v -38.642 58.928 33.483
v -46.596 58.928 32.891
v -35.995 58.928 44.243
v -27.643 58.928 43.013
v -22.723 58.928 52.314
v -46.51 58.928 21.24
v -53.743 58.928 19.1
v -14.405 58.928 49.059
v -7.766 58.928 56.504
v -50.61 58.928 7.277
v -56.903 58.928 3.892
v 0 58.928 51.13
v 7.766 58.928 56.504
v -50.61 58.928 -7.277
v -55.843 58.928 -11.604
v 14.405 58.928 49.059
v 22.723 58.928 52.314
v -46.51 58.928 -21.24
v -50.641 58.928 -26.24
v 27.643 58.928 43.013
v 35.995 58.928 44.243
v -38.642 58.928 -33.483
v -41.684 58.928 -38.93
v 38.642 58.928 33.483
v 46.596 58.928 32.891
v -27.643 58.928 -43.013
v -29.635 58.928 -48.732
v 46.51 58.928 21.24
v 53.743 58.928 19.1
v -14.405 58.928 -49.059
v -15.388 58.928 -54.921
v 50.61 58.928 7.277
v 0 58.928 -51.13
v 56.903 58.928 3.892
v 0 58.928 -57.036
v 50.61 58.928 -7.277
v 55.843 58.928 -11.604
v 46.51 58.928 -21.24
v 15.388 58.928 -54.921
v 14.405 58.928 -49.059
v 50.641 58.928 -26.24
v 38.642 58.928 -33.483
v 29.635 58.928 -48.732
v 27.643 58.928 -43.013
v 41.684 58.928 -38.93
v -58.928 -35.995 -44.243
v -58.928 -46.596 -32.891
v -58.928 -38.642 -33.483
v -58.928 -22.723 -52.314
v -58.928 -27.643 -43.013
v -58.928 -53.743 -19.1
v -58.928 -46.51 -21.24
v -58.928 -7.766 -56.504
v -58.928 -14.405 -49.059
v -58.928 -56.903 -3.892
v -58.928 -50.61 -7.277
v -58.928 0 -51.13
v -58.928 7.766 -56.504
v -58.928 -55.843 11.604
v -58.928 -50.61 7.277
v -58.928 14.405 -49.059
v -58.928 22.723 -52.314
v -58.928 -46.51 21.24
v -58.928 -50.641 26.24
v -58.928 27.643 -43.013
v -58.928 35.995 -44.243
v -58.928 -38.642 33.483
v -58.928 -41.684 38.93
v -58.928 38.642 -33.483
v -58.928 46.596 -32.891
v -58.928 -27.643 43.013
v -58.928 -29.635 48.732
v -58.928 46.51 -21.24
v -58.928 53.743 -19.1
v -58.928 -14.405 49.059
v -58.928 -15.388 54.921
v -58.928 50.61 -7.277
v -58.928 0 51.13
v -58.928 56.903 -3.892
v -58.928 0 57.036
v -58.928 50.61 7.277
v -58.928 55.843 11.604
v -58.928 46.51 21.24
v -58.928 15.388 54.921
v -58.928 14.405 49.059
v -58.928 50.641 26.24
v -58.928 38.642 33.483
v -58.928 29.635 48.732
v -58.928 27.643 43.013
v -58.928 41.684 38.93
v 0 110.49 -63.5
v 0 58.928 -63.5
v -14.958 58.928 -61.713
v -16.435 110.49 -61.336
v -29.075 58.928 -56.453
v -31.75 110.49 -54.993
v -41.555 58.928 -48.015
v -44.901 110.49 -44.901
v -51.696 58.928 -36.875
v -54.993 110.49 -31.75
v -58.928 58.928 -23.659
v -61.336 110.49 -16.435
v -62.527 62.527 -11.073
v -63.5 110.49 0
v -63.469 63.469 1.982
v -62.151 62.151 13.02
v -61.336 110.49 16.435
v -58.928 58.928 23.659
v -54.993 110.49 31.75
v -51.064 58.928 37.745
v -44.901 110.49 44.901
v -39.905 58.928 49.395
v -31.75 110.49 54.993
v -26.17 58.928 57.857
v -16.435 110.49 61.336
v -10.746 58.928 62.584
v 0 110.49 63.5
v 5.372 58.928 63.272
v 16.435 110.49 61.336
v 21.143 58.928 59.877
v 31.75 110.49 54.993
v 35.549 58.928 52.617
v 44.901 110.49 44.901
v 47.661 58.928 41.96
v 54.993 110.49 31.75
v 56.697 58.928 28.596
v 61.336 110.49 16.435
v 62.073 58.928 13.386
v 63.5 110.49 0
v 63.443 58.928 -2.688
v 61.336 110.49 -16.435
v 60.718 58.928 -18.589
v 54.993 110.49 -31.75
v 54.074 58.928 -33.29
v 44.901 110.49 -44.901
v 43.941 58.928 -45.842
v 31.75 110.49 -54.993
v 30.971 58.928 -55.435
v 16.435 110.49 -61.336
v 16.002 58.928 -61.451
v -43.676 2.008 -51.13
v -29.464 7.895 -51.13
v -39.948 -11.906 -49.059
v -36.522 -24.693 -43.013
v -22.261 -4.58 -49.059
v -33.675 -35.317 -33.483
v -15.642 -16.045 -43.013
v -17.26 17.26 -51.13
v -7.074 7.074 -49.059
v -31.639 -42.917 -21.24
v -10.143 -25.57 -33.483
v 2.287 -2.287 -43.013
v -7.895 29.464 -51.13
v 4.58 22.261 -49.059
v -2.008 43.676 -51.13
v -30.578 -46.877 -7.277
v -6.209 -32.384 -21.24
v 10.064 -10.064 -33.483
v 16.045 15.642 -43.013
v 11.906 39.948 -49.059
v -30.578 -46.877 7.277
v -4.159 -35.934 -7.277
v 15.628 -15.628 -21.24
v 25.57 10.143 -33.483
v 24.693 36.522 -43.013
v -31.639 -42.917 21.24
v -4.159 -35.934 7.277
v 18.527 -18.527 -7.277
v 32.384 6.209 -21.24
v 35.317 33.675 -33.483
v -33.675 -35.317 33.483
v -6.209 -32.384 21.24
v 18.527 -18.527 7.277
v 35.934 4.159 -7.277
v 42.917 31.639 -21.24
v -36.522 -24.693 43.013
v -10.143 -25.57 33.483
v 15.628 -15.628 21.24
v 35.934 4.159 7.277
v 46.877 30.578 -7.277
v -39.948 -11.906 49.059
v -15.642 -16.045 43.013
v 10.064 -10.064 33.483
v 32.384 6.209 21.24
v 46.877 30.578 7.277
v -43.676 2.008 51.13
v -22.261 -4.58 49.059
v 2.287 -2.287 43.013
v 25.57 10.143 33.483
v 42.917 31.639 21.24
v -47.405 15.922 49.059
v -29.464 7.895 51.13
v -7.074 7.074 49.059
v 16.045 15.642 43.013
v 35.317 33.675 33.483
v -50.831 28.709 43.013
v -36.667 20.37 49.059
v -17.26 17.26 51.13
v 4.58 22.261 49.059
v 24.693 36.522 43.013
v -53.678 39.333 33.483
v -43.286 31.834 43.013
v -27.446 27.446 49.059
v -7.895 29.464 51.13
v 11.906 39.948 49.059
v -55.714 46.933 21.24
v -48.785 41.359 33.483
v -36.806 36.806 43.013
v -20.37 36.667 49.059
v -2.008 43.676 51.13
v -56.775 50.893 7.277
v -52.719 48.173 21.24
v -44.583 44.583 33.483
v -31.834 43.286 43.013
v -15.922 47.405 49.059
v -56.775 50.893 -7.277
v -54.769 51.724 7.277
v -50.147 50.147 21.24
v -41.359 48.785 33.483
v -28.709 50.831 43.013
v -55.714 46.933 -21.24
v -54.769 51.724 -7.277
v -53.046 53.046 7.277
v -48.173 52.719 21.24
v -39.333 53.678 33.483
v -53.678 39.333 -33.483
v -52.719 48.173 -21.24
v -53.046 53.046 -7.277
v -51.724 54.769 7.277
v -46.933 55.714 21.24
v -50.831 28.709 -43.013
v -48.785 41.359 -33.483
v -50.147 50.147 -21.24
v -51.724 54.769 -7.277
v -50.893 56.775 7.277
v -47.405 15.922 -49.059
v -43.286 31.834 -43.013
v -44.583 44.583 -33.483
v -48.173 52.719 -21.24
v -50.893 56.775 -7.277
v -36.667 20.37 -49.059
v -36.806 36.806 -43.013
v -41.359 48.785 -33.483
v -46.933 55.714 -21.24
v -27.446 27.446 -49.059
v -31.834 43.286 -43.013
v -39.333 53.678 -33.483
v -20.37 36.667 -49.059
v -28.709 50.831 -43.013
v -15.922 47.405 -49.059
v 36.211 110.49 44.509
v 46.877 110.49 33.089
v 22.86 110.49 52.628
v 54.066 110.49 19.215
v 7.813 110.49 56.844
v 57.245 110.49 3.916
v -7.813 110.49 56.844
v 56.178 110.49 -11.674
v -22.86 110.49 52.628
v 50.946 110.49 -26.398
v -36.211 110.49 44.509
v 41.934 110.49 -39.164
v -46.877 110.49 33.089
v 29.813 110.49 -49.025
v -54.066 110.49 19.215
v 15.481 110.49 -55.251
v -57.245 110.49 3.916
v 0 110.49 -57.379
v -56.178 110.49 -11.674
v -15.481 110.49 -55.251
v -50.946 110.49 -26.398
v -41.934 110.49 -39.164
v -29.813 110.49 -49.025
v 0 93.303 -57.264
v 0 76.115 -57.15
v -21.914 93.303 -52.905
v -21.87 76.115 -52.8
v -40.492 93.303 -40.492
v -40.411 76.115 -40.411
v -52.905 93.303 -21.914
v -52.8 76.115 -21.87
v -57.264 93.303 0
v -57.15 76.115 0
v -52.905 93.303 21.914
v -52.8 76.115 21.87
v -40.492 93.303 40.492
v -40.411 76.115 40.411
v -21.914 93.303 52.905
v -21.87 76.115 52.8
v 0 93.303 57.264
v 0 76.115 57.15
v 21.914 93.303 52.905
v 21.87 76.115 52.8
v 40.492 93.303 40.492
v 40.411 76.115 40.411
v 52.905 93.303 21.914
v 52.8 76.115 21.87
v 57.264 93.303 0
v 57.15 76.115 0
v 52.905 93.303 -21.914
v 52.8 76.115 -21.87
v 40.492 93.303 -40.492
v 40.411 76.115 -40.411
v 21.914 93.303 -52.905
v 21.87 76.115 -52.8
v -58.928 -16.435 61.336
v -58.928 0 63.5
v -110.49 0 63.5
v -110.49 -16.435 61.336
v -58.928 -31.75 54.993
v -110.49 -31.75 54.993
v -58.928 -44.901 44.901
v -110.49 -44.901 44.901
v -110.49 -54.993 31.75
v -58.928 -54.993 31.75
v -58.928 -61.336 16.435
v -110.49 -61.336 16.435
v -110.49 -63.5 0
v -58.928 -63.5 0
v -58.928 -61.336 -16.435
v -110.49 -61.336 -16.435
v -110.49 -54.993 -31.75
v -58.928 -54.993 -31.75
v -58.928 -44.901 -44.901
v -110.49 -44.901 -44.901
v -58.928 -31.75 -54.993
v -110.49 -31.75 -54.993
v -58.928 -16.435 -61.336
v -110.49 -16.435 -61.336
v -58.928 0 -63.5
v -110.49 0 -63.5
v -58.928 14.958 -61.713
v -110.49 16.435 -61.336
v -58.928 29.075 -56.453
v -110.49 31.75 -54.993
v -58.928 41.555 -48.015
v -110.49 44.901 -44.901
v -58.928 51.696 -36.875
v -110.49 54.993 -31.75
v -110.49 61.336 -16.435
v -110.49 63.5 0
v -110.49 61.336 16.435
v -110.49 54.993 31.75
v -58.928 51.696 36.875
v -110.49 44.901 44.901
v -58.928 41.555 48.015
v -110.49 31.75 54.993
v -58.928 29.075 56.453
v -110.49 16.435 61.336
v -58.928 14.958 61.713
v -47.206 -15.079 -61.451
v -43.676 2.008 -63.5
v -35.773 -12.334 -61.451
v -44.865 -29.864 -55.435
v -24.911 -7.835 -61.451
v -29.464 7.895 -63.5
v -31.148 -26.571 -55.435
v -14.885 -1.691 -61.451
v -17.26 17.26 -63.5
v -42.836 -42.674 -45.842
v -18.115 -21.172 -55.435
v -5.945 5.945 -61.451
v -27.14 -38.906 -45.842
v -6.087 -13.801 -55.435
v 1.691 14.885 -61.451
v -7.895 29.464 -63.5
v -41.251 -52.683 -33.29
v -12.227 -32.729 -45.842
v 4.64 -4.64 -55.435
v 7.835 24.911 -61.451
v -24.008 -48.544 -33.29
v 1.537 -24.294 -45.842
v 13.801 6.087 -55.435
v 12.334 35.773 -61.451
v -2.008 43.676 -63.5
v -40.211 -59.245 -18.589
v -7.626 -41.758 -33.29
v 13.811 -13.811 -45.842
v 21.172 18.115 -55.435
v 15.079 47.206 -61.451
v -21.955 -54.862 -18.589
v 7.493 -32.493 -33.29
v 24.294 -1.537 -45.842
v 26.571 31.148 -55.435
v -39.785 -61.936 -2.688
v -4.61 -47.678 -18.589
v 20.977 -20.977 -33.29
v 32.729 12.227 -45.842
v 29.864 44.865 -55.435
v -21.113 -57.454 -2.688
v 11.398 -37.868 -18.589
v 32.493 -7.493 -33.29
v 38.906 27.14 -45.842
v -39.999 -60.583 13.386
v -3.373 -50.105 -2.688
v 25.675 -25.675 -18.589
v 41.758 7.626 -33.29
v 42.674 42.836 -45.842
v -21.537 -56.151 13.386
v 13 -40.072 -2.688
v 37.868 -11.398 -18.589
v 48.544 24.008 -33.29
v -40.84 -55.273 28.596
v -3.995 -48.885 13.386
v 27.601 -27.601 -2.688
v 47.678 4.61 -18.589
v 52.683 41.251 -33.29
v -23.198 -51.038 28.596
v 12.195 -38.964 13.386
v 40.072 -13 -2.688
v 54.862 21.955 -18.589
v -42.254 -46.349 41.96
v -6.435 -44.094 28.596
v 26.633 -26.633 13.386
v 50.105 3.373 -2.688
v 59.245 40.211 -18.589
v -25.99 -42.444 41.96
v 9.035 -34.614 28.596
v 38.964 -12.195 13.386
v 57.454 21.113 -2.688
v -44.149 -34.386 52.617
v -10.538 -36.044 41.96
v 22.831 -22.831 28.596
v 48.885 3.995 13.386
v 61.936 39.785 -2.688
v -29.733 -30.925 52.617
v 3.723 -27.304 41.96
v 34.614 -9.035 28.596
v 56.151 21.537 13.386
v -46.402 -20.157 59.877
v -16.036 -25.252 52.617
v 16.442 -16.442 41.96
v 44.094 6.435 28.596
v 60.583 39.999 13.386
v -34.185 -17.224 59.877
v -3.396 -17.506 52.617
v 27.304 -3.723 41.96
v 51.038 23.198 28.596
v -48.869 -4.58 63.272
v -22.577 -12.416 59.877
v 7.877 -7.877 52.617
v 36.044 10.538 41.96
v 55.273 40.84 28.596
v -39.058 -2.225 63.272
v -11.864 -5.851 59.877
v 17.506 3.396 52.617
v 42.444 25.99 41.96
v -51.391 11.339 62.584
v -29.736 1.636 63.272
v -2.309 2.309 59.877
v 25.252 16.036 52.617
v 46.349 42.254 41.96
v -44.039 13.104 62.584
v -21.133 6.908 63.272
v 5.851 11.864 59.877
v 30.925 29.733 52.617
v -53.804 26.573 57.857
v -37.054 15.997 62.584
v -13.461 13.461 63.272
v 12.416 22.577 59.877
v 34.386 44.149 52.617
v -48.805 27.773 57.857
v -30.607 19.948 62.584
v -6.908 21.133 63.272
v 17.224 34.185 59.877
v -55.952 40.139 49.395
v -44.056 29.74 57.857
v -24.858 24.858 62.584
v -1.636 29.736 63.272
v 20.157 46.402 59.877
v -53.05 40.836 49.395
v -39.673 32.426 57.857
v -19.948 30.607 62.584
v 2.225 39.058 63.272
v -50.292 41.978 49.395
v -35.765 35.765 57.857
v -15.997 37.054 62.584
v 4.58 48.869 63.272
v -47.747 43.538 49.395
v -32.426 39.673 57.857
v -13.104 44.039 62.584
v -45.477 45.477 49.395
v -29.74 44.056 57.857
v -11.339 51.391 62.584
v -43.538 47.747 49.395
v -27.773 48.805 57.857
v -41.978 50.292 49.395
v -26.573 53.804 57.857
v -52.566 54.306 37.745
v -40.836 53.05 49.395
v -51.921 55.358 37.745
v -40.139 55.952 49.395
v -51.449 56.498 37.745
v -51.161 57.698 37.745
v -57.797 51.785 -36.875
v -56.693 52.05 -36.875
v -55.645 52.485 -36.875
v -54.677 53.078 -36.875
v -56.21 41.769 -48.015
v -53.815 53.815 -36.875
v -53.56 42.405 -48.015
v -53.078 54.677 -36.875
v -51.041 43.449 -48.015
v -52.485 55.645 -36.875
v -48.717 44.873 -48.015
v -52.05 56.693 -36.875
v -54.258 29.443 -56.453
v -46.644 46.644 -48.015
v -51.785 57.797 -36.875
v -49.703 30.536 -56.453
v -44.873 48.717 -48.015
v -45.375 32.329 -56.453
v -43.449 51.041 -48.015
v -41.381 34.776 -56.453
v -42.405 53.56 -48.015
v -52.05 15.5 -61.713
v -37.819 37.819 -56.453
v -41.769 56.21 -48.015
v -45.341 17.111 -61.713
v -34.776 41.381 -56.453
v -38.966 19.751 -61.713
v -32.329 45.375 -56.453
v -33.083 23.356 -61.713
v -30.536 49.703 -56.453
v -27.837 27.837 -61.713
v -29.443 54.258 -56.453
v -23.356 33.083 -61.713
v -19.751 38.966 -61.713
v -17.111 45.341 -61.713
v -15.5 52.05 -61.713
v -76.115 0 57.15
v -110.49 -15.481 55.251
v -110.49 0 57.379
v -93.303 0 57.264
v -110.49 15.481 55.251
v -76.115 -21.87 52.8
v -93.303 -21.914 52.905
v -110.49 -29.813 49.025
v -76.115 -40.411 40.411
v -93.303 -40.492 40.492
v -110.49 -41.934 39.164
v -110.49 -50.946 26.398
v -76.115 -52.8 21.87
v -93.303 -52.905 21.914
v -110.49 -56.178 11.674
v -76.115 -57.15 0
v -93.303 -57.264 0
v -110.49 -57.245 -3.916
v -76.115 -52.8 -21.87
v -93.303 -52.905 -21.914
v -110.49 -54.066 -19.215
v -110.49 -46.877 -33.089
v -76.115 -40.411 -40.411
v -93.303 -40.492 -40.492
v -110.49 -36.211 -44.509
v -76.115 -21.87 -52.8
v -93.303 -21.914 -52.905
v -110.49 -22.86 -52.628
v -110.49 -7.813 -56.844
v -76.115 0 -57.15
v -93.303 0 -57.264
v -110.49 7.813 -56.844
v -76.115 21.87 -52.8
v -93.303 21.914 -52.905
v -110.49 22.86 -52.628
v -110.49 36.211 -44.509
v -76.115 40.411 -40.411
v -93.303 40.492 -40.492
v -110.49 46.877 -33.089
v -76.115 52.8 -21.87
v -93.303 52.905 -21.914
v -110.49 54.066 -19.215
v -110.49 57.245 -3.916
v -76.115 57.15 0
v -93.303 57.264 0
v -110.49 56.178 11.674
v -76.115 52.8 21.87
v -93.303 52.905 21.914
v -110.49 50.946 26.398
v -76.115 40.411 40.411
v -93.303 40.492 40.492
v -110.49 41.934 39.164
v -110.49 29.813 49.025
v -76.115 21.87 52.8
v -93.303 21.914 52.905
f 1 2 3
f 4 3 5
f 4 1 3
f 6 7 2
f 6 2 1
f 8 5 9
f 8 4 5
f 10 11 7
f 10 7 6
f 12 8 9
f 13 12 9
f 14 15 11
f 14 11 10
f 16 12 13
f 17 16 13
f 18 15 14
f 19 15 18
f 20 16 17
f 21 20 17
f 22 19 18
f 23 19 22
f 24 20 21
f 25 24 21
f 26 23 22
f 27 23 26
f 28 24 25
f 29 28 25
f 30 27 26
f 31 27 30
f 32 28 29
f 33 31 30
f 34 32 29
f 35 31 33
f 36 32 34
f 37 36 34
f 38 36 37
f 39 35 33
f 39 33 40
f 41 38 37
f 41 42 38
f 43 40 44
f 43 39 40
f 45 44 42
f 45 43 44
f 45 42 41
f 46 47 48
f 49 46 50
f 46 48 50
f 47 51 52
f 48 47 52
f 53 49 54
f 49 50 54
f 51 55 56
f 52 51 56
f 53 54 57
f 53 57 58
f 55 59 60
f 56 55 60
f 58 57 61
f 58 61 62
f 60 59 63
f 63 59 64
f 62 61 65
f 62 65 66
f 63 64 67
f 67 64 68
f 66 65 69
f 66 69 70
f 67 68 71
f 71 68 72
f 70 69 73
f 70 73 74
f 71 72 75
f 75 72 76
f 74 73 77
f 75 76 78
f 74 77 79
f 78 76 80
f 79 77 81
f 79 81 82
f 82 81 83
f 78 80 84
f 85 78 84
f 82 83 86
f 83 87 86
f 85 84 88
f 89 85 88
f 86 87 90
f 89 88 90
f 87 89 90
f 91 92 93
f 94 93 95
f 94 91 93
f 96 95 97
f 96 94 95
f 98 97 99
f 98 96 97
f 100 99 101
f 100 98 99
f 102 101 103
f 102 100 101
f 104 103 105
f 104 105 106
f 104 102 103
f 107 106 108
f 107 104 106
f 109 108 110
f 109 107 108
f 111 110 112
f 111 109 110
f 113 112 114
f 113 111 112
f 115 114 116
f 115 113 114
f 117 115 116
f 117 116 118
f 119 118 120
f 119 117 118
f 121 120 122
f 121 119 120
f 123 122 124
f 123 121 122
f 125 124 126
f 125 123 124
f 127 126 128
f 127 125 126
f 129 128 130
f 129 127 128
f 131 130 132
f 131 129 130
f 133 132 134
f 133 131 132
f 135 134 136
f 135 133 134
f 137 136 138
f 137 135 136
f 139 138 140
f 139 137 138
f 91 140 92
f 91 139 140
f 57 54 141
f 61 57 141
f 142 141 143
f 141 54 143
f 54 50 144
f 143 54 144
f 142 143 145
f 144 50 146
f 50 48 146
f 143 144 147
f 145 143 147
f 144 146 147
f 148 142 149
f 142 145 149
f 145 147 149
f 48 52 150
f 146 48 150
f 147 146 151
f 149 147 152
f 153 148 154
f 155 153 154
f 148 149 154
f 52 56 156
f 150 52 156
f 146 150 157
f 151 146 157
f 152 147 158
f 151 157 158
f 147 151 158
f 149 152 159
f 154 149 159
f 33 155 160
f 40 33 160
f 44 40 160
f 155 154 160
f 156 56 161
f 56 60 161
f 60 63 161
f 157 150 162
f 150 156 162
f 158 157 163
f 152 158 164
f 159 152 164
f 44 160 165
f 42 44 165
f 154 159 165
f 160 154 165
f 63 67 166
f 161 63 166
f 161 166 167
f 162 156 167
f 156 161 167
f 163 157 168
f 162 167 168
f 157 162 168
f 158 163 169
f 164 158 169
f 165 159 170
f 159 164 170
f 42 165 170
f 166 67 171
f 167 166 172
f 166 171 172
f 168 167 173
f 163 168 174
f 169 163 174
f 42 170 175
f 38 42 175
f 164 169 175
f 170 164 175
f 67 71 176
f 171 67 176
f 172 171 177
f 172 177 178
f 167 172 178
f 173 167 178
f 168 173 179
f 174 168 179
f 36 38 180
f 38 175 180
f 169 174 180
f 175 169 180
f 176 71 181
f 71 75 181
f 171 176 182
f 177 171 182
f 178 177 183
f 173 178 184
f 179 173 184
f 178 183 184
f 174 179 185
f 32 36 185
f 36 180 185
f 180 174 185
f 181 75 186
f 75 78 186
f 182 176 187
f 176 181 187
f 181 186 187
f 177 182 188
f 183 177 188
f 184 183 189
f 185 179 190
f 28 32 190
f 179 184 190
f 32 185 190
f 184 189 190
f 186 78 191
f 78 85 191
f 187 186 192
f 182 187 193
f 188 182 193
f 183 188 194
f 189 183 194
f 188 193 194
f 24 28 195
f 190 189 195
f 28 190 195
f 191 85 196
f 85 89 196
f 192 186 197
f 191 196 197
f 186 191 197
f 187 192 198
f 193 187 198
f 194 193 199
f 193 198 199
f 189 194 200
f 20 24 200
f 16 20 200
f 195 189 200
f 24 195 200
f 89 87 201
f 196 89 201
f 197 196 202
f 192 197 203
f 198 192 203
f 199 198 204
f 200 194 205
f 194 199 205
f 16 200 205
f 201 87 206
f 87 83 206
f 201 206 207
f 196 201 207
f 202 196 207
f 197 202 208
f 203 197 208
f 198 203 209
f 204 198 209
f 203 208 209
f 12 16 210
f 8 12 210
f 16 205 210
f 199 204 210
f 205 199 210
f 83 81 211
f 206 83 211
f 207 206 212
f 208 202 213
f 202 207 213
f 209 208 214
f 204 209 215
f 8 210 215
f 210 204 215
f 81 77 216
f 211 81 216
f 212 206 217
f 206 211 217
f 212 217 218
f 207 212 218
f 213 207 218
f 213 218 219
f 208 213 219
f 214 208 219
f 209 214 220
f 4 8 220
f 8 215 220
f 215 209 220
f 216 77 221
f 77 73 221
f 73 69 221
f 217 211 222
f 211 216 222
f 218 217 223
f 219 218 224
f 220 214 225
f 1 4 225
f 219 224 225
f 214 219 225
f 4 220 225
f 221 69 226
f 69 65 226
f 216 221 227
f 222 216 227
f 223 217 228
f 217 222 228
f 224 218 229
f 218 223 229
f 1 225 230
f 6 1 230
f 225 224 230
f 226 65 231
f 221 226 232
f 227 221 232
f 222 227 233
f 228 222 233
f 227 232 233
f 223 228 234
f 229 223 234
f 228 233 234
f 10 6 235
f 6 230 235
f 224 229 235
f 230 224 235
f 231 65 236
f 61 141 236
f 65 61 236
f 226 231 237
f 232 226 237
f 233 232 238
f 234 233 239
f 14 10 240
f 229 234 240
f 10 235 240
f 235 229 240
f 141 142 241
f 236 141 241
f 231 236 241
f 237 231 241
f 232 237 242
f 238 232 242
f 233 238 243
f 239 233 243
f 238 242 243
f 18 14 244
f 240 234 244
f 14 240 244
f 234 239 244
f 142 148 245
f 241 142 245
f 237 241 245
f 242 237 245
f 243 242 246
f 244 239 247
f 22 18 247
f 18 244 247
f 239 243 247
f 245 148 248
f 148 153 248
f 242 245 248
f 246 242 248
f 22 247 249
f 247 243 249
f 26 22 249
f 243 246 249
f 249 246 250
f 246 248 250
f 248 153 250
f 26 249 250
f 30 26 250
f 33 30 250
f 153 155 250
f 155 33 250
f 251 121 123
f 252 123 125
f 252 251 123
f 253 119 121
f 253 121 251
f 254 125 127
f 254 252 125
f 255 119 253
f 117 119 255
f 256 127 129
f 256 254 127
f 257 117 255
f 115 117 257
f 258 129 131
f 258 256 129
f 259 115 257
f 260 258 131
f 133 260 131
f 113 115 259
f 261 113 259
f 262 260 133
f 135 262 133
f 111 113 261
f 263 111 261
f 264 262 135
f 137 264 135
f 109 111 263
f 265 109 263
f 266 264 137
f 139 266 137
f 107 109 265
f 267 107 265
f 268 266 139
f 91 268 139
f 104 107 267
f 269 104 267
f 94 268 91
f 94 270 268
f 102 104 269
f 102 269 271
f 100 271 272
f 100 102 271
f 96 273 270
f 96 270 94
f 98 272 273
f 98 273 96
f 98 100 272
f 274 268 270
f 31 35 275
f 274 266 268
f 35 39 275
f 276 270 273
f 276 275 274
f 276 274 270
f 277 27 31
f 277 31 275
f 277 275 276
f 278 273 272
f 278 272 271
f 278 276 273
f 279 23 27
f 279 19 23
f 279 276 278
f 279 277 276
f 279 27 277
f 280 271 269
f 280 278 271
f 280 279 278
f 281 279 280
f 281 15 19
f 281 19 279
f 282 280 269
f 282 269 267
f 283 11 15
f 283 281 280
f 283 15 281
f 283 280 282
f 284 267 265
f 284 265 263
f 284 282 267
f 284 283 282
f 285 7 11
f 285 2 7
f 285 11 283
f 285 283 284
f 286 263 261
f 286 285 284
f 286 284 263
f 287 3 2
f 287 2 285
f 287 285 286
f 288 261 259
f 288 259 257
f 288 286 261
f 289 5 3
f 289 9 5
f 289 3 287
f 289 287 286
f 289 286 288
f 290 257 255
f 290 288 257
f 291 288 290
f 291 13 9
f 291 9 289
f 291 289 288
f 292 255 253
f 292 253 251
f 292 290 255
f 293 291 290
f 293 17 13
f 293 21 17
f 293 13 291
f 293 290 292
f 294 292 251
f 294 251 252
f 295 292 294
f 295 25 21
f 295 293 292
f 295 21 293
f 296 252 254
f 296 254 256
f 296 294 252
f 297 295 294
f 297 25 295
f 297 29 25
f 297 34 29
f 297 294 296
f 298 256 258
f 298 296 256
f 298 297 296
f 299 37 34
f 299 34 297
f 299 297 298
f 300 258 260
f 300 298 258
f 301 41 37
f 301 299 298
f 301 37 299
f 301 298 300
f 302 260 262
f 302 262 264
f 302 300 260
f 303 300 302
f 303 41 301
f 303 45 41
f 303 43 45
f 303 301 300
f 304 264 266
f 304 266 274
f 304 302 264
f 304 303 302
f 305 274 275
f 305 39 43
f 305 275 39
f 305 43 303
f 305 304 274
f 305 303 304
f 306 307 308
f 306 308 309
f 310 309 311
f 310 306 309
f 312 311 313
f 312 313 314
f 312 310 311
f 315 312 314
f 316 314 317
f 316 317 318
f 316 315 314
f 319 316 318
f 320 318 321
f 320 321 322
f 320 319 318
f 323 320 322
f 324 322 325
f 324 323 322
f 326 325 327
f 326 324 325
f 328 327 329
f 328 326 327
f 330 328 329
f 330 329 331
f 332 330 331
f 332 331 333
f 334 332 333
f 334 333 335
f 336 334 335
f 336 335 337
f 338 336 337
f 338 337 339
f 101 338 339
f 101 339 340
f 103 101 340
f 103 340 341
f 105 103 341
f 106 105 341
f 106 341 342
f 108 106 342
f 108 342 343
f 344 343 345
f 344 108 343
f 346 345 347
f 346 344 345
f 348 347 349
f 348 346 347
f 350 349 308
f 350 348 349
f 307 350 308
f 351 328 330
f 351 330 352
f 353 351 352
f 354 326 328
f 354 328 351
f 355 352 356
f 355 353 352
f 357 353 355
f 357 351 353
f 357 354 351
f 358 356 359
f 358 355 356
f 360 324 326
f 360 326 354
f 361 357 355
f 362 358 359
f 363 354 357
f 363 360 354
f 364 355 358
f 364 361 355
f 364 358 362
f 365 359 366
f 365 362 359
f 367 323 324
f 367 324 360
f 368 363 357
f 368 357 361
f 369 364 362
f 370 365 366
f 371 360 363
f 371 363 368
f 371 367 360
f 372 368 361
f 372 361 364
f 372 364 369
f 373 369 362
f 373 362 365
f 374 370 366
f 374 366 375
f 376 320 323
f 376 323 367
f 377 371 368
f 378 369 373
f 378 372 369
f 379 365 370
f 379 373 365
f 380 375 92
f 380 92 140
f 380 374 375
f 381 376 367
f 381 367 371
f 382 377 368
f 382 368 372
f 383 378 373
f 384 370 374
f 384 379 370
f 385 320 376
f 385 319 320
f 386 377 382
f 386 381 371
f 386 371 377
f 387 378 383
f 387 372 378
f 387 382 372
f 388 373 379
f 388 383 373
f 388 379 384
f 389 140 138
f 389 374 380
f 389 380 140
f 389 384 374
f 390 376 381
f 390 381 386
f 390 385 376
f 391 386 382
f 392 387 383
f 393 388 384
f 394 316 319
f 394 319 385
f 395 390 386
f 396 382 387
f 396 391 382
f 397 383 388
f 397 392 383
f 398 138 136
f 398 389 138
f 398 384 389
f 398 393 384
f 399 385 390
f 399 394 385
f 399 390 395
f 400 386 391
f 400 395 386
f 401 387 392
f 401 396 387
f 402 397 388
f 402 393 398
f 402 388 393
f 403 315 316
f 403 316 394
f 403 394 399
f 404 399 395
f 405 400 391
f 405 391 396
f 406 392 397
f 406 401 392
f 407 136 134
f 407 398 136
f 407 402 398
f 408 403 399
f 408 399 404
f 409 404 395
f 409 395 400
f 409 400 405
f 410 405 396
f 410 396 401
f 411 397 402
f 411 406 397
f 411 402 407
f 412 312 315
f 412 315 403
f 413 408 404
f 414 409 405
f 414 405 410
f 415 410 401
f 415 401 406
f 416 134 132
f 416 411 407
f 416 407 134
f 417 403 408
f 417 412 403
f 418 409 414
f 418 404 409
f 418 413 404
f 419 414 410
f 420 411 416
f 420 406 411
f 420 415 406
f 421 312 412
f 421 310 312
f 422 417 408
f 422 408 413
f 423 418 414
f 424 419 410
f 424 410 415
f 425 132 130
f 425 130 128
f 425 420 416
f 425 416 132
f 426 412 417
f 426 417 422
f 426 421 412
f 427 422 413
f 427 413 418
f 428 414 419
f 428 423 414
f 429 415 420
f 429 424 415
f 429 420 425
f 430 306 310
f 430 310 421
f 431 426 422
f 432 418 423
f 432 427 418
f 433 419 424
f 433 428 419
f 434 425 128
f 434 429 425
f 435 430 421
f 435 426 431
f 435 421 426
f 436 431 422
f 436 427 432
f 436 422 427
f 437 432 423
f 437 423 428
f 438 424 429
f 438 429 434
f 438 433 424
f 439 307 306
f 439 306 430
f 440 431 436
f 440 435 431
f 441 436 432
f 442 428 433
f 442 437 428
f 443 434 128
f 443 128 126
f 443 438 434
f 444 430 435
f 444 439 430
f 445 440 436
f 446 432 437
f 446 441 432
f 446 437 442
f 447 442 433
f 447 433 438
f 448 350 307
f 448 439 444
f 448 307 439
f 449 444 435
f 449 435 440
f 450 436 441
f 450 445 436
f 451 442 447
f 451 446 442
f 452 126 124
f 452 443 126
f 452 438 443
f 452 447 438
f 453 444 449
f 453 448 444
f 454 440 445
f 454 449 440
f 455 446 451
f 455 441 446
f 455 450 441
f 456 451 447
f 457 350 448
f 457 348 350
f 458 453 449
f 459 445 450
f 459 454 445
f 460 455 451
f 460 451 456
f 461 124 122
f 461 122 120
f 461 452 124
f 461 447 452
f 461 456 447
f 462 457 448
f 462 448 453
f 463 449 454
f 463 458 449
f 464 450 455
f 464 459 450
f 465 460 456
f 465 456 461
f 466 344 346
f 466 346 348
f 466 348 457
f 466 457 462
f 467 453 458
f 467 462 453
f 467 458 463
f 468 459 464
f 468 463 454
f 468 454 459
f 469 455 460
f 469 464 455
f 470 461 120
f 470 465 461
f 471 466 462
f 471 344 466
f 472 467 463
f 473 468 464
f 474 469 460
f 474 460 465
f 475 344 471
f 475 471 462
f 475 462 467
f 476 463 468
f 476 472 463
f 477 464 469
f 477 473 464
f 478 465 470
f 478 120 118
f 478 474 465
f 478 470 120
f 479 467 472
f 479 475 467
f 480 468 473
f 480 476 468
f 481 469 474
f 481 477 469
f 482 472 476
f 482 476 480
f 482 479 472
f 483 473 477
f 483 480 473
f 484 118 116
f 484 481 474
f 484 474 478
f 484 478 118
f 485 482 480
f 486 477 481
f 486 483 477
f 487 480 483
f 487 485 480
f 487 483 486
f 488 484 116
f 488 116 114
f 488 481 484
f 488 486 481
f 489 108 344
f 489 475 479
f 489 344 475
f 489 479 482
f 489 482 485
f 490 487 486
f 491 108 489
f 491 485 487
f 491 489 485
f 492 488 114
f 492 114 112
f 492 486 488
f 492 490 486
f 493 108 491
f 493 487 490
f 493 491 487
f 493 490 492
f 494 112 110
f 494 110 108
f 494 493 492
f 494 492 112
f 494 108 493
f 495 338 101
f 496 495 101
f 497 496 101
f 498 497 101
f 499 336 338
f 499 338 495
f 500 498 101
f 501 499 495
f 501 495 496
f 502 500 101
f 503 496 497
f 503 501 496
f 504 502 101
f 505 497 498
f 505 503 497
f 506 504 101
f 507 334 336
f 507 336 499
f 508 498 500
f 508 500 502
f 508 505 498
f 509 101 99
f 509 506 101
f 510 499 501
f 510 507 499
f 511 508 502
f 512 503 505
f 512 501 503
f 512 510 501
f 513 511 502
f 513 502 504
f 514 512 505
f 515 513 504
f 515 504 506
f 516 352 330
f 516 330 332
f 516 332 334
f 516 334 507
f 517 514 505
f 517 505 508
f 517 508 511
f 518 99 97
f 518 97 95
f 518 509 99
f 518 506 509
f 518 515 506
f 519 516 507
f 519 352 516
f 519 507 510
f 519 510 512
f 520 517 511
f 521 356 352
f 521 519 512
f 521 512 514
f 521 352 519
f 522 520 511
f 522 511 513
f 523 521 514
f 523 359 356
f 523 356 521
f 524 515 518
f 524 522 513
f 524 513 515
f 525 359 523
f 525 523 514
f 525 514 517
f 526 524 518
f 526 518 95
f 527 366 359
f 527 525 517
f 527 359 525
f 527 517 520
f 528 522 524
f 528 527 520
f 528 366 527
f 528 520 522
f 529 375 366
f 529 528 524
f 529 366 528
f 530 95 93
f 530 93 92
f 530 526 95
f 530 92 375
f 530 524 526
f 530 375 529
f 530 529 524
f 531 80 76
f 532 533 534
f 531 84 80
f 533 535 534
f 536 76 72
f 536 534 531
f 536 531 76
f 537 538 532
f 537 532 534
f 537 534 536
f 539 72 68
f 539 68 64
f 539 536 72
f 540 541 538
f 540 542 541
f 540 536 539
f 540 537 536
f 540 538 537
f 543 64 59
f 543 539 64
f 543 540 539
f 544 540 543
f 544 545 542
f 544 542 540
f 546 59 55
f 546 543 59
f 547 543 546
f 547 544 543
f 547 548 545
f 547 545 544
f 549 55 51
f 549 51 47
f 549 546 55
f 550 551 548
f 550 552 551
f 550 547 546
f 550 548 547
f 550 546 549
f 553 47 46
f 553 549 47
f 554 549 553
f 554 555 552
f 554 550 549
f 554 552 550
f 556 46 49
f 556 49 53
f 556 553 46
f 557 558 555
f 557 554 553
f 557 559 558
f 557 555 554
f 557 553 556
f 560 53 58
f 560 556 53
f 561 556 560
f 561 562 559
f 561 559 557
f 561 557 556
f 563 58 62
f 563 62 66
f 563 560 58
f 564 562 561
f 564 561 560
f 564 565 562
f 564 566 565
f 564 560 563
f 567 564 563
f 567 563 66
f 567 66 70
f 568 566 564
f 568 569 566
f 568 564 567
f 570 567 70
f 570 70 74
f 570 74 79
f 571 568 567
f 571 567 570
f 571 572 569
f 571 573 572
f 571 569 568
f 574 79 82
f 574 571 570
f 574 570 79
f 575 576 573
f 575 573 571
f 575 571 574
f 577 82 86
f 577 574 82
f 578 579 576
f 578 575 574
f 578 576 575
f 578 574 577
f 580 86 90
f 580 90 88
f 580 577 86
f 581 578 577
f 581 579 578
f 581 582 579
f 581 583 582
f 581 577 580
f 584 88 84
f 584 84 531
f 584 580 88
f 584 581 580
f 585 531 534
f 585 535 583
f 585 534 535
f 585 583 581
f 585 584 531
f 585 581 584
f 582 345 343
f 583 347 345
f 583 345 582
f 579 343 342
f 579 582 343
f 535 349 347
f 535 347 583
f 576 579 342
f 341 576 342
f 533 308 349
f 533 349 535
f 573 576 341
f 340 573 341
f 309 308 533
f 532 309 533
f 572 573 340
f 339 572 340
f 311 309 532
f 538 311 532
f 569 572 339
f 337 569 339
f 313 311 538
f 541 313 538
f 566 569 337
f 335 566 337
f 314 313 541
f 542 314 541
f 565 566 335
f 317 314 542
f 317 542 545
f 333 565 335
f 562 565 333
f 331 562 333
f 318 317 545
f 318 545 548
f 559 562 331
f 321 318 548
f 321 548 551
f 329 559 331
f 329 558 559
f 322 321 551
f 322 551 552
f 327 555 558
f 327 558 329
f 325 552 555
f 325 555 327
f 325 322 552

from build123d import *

# Parameters (mm, degrees)
SKETCH3_R   = 63.5
SKETCH3_R_2 = 51.1302


with BuildPart() as part:
    # Sketch1 → Revolve1 (revolve)
    with BuildSketch(Plane.XY):
        Polygon((-110.49, -63.5), (-58.928, -63.5), (-58.928, -57.0357), (-110.49, -57.3786), align=None)
    revolve(axis=Axis((-110.49, 0, 0), (1, 0, 0)))


with BuildPart() as body_2:
    # Sketch2 → Revolve2 (revolve)
    with BuildSketch(Plane.XY):
        Polygon((57.3786, 110.49), (57.0357, 58.928), (63.5, 58.928), (63.5, 110.49), align=None)
    revolve(axis=Axis((0, 0, 0), (0, 1, 0)))


with BuildPart() as sweep1_tool:
    # Sweep1: sweep along a path in Sketch4
    with BuildLine(Plane.XY) as sweep1_path:
        ThreePointArc((-58.928, 0), (-17.259612, 17.259612), (0, 58.928))
    # Sketch3 → Sweep1 (sweep)
    with BuildSketch(Plane(origin=(-58.928, 0, 0), x_dir=(0, 0, -1), z_dir=(1, 0, 0))):
        Circle(SKETCH3_R)
        Circle(SKETCH3_R_2, mode=Mode.SUBTRACT)
    sweep(path=sweep1_path.line)


with BuildPart() as part_1:
    add(part.part)


with BuildPart() as part_2:
    # Sweep1: joined with sweep1_tool
    add(part_1.part.fuse(sweep1_tool.part, body_2.part, tol=0.00001))


solid = part_2.part
